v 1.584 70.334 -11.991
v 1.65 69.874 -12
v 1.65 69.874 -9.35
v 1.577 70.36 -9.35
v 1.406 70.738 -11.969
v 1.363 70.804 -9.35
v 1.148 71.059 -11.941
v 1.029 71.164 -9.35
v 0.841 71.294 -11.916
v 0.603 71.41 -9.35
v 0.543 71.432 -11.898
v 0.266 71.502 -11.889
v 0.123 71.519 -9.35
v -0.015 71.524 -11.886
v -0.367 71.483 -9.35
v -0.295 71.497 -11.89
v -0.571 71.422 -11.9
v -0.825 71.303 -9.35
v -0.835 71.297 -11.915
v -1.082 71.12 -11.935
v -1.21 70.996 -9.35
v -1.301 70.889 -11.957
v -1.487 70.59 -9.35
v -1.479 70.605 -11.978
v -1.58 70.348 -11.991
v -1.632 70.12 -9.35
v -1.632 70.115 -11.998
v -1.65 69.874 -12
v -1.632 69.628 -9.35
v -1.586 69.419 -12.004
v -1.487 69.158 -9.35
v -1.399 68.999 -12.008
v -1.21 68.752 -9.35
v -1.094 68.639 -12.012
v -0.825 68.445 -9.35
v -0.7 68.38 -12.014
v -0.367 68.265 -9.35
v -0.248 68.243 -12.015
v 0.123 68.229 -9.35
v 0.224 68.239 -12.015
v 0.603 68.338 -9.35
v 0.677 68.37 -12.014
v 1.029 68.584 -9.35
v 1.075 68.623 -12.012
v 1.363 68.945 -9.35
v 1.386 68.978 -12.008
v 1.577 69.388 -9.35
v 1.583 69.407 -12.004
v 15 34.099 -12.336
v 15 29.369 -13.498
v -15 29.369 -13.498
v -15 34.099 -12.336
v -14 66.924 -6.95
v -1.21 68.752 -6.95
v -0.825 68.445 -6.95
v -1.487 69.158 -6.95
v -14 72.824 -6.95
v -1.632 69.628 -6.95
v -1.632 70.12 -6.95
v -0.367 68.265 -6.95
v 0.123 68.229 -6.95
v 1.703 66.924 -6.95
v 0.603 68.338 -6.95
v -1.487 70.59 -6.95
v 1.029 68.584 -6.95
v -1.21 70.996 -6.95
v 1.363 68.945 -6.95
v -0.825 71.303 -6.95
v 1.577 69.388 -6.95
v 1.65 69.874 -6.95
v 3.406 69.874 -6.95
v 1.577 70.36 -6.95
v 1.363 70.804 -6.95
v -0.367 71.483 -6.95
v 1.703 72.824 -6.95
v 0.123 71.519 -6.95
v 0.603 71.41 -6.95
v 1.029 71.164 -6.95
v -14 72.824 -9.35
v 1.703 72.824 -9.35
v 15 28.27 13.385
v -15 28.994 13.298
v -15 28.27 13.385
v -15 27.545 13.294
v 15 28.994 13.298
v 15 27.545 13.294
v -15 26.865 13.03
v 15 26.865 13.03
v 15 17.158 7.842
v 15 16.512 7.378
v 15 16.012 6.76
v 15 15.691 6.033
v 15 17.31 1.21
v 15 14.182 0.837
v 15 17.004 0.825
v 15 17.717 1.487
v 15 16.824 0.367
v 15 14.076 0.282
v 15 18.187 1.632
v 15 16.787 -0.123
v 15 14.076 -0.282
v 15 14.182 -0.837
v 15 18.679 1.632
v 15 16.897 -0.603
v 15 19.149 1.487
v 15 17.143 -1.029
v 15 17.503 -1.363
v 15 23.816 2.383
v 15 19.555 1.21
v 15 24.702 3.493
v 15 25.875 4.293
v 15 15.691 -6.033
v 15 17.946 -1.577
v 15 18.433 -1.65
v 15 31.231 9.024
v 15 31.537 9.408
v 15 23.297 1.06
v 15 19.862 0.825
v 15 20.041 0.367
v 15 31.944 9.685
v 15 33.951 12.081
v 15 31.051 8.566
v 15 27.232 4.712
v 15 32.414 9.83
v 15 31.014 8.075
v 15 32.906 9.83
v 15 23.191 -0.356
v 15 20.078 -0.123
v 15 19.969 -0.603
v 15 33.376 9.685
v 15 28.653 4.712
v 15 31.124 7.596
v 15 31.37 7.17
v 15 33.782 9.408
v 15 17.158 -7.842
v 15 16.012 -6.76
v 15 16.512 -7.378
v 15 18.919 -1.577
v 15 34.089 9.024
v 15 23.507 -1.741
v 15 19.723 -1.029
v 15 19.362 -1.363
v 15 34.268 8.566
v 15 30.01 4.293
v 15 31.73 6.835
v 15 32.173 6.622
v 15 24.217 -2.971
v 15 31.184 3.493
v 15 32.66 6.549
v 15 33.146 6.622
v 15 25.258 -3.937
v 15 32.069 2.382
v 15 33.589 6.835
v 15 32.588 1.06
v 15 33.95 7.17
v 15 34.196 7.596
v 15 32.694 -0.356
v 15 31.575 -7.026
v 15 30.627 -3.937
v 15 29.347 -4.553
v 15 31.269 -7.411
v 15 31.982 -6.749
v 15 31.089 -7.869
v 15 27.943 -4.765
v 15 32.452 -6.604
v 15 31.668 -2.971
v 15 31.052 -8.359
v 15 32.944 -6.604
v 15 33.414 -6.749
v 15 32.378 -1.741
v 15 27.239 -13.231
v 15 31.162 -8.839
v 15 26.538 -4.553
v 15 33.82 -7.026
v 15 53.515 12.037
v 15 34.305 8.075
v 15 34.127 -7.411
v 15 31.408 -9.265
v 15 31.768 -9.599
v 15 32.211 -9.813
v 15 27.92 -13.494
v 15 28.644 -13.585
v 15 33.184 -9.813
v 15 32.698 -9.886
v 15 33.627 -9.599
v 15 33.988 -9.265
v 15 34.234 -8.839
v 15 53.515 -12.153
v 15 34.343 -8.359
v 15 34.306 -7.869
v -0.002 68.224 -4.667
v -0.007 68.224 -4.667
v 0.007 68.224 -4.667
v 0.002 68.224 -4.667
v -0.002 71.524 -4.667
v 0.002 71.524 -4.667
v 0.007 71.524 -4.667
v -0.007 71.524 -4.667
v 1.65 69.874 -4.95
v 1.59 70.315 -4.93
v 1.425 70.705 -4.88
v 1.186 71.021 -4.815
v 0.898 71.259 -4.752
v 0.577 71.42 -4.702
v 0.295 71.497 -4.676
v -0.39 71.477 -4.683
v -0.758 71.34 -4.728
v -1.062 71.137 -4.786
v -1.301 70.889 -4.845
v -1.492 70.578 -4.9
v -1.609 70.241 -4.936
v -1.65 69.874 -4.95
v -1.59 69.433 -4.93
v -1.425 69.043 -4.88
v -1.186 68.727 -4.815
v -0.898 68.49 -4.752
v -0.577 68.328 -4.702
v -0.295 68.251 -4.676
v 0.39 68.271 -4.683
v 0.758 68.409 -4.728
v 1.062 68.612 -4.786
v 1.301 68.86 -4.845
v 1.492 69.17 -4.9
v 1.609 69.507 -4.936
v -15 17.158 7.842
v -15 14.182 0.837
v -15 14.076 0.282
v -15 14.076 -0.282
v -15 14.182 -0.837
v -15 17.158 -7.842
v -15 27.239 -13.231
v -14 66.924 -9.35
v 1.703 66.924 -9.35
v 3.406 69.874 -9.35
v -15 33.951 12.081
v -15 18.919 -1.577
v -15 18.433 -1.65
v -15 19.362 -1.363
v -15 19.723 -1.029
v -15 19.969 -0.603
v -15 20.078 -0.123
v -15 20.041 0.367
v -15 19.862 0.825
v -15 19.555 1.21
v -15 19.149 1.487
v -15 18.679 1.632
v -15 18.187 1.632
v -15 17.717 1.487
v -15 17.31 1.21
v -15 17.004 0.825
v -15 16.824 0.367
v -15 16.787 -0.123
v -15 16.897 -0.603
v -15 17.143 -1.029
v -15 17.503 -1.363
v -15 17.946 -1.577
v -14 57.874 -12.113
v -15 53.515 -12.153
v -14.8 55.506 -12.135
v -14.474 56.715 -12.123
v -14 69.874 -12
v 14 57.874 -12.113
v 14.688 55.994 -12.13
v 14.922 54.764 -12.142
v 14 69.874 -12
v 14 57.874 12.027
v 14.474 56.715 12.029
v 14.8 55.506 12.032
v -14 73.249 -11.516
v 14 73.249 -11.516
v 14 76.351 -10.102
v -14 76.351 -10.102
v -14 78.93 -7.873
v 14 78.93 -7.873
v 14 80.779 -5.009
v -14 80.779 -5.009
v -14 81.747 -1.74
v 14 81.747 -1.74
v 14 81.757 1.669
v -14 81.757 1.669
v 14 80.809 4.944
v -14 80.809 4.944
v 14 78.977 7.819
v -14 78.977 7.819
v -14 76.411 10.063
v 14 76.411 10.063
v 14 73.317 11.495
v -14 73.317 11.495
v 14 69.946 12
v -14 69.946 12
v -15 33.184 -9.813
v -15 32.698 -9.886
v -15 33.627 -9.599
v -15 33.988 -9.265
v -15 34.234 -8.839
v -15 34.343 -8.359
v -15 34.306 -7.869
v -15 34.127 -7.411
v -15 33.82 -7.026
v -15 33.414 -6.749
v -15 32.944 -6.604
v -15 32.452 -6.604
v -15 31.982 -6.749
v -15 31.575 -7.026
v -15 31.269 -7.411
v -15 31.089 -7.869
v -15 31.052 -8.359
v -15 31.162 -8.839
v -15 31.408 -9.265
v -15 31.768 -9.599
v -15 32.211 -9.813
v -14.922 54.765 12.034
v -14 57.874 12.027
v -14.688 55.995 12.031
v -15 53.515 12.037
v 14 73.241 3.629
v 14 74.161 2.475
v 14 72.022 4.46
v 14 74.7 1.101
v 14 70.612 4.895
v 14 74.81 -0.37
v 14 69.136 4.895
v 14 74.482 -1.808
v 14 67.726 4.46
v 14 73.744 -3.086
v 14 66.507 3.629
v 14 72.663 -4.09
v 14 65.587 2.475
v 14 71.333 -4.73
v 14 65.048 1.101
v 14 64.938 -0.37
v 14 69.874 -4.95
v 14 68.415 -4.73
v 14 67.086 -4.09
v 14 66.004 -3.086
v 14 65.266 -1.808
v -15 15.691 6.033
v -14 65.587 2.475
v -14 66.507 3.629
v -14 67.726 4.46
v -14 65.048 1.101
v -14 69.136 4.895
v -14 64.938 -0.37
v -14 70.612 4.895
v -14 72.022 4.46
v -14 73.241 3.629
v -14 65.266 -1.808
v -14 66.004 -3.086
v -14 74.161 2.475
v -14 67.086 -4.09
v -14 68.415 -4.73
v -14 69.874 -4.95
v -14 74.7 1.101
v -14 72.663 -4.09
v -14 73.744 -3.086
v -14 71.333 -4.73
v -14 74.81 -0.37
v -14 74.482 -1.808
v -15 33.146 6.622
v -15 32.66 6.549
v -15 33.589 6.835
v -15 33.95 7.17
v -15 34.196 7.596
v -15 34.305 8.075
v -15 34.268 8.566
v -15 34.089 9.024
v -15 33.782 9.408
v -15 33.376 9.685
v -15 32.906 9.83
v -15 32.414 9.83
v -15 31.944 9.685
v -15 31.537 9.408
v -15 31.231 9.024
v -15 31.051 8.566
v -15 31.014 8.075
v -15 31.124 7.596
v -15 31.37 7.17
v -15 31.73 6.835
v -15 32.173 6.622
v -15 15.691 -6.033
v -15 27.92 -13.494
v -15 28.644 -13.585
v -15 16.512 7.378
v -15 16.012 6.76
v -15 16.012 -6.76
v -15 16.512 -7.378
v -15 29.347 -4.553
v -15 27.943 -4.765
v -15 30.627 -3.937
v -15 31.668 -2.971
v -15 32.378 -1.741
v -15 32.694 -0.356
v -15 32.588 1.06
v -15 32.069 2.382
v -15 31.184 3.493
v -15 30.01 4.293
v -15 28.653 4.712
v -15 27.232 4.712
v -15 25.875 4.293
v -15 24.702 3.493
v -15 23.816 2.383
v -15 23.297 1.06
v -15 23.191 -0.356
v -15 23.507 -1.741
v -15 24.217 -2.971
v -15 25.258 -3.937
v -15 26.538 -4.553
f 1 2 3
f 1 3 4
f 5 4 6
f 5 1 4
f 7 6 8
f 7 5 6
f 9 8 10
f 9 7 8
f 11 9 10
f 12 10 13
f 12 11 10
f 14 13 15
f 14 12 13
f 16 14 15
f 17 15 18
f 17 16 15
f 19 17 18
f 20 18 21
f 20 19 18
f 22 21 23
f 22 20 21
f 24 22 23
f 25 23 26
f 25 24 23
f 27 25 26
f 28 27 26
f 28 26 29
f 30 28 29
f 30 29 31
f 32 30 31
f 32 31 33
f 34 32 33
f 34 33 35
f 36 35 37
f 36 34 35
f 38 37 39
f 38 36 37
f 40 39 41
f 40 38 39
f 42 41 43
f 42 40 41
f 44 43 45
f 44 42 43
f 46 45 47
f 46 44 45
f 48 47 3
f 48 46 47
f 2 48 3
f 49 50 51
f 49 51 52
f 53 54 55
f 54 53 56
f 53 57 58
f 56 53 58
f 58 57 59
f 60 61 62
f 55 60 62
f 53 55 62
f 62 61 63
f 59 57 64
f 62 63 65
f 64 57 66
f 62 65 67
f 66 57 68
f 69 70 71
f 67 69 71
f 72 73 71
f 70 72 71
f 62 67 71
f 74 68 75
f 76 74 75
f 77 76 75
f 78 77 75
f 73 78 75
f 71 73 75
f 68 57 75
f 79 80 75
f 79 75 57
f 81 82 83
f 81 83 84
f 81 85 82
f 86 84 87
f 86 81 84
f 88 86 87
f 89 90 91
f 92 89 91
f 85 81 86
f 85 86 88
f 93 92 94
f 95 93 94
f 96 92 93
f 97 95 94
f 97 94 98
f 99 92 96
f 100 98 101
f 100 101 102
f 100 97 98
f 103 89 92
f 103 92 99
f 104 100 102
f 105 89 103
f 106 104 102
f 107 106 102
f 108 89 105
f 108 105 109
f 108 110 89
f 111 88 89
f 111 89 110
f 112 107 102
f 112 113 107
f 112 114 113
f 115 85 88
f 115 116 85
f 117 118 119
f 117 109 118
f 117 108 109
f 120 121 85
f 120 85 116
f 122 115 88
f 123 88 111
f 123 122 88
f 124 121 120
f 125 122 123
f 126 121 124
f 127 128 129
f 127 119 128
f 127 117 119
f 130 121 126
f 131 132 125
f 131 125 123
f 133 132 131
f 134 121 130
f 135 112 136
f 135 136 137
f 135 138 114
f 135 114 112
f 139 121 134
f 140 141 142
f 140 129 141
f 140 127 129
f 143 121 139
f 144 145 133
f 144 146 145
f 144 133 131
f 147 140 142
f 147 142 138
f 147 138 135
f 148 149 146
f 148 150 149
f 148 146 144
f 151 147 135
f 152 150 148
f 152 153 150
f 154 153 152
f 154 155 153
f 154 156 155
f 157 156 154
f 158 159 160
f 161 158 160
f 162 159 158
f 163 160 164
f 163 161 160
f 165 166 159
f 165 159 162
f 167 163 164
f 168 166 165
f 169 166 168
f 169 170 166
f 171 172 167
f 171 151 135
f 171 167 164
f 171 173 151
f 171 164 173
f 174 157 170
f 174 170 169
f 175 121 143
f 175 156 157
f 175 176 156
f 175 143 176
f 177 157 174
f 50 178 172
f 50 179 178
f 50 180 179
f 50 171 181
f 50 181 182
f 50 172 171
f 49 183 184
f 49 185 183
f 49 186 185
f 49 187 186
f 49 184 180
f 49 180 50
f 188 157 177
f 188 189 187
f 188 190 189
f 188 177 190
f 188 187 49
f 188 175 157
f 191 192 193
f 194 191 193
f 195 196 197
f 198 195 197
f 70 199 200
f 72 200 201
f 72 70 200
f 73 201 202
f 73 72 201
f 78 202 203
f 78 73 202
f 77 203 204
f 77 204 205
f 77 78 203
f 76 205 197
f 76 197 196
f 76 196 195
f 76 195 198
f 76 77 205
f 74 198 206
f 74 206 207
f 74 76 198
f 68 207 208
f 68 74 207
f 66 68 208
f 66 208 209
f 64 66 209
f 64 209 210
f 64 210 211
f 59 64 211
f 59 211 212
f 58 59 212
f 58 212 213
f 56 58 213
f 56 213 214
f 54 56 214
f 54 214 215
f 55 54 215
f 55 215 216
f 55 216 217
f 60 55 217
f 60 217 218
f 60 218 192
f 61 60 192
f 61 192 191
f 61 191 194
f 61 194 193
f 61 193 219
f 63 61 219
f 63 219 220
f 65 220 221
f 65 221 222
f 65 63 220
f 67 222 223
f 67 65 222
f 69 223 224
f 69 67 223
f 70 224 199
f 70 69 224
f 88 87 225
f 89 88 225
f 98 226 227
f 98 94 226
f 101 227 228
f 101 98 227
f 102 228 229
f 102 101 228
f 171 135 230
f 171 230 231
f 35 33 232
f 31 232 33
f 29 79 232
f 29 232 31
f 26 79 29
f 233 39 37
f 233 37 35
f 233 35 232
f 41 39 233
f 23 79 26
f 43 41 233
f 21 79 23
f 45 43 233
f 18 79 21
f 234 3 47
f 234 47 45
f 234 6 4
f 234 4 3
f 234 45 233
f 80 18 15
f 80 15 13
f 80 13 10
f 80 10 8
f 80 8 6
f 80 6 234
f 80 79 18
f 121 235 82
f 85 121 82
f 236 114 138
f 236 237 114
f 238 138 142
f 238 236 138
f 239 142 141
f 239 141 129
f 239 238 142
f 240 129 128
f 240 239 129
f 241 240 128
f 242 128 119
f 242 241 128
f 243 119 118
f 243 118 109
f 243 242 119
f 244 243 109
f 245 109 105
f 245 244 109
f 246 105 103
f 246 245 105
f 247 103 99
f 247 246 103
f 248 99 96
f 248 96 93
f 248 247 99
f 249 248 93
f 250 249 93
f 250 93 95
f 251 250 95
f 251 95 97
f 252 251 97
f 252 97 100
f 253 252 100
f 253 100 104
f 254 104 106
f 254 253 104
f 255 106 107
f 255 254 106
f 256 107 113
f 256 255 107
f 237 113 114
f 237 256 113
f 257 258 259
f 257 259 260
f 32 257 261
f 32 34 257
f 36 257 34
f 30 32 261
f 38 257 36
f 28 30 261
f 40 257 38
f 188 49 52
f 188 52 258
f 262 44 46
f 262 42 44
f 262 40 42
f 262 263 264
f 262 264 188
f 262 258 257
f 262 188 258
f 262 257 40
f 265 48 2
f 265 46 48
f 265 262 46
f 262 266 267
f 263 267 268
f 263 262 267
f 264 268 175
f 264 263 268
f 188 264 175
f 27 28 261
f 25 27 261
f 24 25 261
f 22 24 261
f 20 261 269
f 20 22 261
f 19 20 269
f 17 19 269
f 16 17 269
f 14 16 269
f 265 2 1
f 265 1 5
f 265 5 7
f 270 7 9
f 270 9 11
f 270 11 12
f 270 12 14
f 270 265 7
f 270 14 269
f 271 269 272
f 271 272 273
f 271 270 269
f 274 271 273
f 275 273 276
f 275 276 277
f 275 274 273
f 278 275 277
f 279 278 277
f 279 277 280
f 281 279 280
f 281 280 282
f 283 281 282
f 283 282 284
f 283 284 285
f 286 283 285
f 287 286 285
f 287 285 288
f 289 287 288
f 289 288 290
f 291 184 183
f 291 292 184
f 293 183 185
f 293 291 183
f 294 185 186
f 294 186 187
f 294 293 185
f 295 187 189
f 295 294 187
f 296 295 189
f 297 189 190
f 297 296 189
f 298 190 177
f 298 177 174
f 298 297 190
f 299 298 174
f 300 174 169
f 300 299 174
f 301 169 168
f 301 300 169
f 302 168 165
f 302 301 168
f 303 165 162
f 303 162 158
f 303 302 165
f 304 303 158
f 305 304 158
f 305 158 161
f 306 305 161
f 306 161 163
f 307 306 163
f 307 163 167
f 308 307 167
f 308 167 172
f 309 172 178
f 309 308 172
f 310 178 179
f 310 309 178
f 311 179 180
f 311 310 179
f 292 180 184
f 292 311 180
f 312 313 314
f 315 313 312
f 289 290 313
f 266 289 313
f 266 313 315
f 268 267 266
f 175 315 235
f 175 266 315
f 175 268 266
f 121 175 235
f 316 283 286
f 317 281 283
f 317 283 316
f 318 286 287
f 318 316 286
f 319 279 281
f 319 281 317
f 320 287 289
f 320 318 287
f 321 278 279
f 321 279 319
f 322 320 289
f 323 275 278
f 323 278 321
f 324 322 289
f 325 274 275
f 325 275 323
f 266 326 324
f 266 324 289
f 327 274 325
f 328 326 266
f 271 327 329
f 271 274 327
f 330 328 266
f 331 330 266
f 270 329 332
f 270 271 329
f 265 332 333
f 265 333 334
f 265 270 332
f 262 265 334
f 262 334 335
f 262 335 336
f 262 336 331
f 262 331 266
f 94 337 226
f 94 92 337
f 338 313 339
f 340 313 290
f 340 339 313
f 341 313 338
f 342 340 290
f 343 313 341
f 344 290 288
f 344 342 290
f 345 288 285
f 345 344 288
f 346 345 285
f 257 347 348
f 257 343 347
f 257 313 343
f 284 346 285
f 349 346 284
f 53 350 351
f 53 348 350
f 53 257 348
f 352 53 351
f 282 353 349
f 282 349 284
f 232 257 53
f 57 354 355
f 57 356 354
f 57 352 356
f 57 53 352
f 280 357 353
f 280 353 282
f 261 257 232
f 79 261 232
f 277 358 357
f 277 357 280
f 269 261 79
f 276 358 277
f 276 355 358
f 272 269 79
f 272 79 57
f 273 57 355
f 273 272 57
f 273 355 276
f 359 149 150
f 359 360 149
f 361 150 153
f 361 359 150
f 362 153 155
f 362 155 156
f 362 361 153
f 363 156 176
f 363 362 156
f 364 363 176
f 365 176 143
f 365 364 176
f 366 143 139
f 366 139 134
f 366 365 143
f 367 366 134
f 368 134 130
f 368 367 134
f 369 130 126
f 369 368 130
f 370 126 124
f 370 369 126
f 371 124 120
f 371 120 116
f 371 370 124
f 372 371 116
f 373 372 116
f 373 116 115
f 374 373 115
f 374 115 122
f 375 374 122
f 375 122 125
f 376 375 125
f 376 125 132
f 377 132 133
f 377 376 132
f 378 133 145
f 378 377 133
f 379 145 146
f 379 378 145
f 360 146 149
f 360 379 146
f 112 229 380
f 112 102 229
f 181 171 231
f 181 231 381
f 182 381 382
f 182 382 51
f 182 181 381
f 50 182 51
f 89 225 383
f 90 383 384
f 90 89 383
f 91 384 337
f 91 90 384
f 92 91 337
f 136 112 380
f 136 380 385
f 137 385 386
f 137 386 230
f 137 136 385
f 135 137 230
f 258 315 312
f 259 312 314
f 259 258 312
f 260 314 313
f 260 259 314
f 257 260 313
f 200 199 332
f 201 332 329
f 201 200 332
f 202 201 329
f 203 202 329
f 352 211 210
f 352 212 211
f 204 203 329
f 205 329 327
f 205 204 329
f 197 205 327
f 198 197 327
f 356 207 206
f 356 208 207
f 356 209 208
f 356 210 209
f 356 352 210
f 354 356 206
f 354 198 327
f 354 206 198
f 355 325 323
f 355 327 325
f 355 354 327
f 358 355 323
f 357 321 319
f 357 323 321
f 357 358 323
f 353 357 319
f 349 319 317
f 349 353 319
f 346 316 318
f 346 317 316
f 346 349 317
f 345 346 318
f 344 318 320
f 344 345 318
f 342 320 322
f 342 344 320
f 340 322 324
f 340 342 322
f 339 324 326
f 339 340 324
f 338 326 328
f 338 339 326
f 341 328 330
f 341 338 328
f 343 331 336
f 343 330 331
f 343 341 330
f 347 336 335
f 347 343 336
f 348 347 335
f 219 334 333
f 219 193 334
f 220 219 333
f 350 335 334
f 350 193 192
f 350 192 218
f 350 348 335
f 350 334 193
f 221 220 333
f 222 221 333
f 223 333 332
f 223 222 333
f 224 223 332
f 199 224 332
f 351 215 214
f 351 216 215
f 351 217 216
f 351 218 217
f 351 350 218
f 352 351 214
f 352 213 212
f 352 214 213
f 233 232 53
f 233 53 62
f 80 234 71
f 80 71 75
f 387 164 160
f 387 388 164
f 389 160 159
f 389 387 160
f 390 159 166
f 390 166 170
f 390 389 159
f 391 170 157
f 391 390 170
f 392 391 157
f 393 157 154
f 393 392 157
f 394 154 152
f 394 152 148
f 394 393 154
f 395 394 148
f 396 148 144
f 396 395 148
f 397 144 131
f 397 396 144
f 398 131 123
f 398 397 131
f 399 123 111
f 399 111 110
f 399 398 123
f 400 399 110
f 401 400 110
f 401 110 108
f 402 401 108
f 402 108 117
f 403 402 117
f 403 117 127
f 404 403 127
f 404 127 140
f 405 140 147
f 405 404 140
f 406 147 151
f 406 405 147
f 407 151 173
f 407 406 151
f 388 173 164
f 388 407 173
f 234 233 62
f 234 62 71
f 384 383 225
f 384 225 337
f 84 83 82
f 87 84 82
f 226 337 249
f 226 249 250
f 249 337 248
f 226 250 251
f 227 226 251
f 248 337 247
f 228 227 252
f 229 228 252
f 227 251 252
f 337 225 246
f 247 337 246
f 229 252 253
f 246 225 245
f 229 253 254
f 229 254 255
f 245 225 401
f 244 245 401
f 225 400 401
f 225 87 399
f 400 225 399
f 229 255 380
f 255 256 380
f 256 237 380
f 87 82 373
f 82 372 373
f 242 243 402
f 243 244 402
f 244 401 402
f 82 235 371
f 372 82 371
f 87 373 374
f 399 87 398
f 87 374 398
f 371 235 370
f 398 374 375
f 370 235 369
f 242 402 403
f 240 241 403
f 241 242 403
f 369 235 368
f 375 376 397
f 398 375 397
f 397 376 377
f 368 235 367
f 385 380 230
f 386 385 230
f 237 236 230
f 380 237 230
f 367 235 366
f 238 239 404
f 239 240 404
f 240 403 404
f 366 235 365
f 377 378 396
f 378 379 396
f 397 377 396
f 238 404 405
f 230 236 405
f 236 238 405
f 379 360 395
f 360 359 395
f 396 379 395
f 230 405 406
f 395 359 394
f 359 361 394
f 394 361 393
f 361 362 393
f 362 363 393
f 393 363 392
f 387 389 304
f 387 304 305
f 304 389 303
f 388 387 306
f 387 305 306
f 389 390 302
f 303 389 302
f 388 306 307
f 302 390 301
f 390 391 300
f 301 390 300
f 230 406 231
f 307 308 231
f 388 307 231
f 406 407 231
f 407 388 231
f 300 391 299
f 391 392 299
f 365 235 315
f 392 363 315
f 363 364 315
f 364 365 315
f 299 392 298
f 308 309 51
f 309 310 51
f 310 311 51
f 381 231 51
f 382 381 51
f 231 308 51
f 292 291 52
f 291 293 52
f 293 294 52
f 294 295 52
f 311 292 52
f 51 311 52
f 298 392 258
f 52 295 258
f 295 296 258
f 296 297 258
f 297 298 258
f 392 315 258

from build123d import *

# Parameters (mm, degrees)
SKETCH3_R                = 4.764999999999999
SKETCH3_R_2              = 1.6499999999999995
SKETCH3_R_3              = 1.6500000000000001
SKETCH3_R_4              = 4.949999999999999
BOSS_EXTRUDE1_DEPTH      = 15
CUT_EXTRUDE2_START       = -13.584871855
CUT_EXTRUDE2_DEPTH       = 26.96953595
CUT_EXTRUDE2_START_2     = -9.35
CUT_EXTRUDE2_2_DEPTH     = 2.4
CUT_EXTRUDE2_START_3     = -12.112585404
CUT_EXTRUDE2_3_OUTLINE_R = 1.65
CUT_EXTRUDE2_3_DEPTH     = 7.445675888


with BuildPart() as part:
    # Sketch3 → Boss-Extrude1 (new, symmetric)
    with BuildSketch(Plane(origin=(0, 0, 0), x_dir=(0, 0, -1), z_dir=(1, 0, 0))):
        with BuildLine():
            Line((0.8367219106320328, 14.181702950289672), (6.032844785264023, 15.69082448784832))
            ThreePointArc((6.032844785264023, 15.69082448784832), (7.085502436432338, 16.24148999245743), (7.8418800486349785, 17.15757597984521))
            Line((7.8418800486349785, 17.15757597984521), (13.230629028910363, 27.2391027259585))
            ThreePointArc((13.230629028910363, 27.2391027259585), (13.56149316864207, 28.279506504021278), (13.498149754436925, 29.369414166277377))
            Line((13.498149754436925, 29.369414166277377), (12.335634292704244, 34.09876588260545))
            Line((12.335634292704244, 34.09876588260545), (12, 69.874079866702))
            ThreePointArc((12, 69.874079866702), (0.03578997764799362, 81.87402649481248), (-11.999786512916659, 69.94565950363487))
            Line((-11.999786512916659, 69.94565950363487), (-12.080609434266979, 33.95094660386098))
            Line((-12.080609434266979, 33.95094660386098), (-13.298066935132345, 28.994347536270237))
            ThreePointArc((-13.298066935132345, 28.994347536270237), (-13.361252777703697, 27.904688590043286), (-13.030421269406453, 26.864544569769336))
            Line((-13.030421269406453, 26.864544569769336), (-7.841880048634967, 17.157575979845202))
            ThreePointArc((-7.841880048634967, 17.157575979845202), (-7.085502436432326, 16.24148999245743), (-6.032844785264015, 15.690824487848316))
            Line((-6.032844785264015, 15.690824487848316), (-0.8367219106320335, 14.18170295028967))
            ThreePointArc((-0.8367219106320335, 14.18170295028967), (1.8e-16, 14.062657036051588), (0.8367219106320328, 14.181702950289672))
        make_face()
        with Locations((1.16e-15, 27.94265703605159)):
            Circle(SKETCH3_R, mode=Mode.SUBTRACT)
        with Locations((0, 18.43265703605159)):
            Circle(SKETCH3_R_2, mode=Mode.SUBTRACT)
        with Locations((8.23590158999005, 32.69765703605151)):
            Circle(SKETCH3_R_3, mode=Mode.SUBTRACT)
        with Locations((-8.19852155344579, 32.659777731318925)):
            Circle(SKETCH3_R_3, mode=Mode.SUBTRACT)
        with Locations((0, 69.874079866702)):
            Circle(SKETCH3_R_4, mode=Mode.SUBTRACT)
    extrude(amount=BOSS_EXTRUDE1_DEPTH, both=True)

    # Cut-Extrude2: read off the stored shape, not the designer's step
    # Cut-Extrude2 outline → Cut-Extrude2 (cut)
    with BuildSketch(Plane.XY.offset(CUT_EXTRUDE2_START)):
        with BuildLine():
            ThreePointArc((-15, 53.515180923), (-14.746794345, 55.751248901), (-14, 57.874079867))
            Line((-14, 57.874079867), (-14, 83))
            Line((-14, 83), (-15, 83))
            Line((-15, 83), (-15, 53.515180923))
        make_face()
        with BuildLine():
            Line((15, 83), (14, 83))
            Line((14, 83), (14, 57.873583349))
            ThreePointArc((14, 57.873583349), (14.746794345, 55.750752383), (15, 53.514684405))
            Line((15, 53.514684405), (15, 83))
        make_face()
    extrude(amount=CUT_EXTRUDE2_DEPTH, mode=Mode.SUBTRACT)

    # Cut-Extrude2 2 outline → Cut-Extrude2 2 (cut)
    with BuildSketch(Plane.XY.offset(CUT_EXTRUDE2_START_2)):
        Polygon((-14, 66.924079867), (1.703183294, 66.924079867), (3.406366588, 69.874079867), (1.703183294, 72.824079867), (-14, 72.824079867), align=None)
    extrude(amount=CUT_EXTRUDE2_2_DEPTH, mode=Mode.SUBTRACT)

    # Cut-Extrude2 3 outline → Cut-Extrude2 3 (cut)
    with BuildSketch(Plane.XY.offset(CUT_EXTRUDE2_START_3)):
        with Locations((0, 69.874079867)):
            Circle(CUT_EXTRUDE2_3_OUTLINE_R)
    extrude(amount=CUT_EXTRUDE2_3_DEPTH, mode=Mode.SUBTRACT)


solid = part.part
